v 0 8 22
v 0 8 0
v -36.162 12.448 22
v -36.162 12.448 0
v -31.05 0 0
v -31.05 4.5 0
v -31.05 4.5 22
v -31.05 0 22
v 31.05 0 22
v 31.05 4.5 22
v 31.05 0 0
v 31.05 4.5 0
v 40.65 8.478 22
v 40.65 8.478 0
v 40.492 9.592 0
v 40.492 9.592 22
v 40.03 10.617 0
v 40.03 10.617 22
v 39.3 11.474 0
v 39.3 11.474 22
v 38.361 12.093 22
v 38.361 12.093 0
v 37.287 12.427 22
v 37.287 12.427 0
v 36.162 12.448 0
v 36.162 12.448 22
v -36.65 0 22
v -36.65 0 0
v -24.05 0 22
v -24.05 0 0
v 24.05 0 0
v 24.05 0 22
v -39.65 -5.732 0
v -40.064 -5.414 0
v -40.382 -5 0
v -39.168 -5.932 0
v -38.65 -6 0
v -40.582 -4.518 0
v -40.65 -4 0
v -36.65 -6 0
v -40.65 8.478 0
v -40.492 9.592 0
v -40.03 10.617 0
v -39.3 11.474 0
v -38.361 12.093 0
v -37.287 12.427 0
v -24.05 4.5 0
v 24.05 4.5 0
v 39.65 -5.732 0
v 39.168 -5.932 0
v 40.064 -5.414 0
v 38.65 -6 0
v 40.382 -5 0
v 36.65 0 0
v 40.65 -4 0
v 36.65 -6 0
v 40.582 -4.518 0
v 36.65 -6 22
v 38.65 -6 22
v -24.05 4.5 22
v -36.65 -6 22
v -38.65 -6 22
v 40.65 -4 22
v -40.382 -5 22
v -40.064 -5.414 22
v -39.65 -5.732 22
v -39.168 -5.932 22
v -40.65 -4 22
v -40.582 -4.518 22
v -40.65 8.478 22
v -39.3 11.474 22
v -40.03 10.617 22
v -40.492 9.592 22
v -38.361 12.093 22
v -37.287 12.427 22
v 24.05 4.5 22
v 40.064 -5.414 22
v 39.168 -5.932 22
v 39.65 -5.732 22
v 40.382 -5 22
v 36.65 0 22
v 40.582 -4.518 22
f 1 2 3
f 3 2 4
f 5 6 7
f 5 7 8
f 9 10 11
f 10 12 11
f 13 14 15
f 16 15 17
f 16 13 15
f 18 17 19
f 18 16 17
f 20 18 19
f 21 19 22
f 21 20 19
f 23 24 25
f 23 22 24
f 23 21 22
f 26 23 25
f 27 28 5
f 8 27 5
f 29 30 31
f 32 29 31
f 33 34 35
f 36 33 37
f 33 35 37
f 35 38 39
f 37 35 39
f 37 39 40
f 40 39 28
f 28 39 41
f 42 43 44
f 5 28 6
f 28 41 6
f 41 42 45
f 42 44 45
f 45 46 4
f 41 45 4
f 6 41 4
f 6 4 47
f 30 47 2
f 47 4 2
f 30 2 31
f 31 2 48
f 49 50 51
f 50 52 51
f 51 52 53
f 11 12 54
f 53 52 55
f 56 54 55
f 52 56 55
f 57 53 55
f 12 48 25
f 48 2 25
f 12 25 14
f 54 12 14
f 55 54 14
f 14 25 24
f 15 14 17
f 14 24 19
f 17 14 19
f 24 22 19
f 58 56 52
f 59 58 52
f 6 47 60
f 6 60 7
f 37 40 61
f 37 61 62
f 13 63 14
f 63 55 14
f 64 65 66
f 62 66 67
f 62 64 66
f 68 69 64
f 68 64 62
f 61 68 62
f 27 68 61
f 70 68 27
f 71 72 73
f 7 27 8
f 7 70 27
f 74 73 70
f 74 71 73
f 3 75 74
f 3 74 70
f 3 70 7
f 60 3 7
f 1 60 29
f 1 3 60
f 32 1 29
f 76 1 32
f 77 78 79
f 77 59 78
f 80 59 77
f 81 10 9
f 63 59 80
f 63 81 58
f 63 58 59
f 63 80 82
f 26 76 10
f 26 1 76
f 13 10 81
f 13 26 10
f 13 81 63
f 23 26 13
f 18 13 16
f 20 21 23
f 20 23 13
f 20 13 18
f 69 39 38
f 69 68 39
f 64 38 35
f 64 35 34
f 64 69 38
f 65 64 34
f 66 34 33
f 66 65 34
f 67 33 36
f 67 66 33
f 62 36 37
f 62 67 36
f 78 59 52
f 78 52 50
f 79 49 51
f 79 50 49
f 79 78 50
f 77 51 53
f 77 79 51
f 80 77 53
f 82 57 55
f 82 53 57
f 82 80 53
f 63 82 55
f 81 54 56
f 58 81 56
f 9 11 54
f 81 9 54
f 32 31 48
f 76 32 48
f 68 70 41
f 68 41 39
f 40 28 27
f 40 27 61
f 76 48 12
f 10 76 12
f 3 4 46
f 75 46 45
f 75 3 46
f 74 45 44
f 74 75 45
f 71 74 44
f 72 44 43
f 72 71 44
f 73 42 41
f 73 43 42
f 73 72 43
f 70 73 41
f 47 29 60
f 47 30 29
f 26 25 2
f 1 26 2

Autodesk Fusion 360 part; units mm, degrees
sketch "Sketch1" plane through (0, 0, 0) normal (0, 0, 1) x (1, 0, 0)
  line L0 (-40.65, 0) -> (40.65, 0)
  line L1 (40.65, 0) -> (40.65, 13)
  line L2 (40.65, 13) -> (0, 8)
  line L3 (0, 8) -> (-40.65, 13)
  line L4 (-40.65, 13) -> (-40.65, 0)
  line L5 (0, 8) -> (0, 0) construction
  dimension "d1" = 13
  dimension "d2" = 8
  dimension "d3" = 81.3
extrude "Extrude1" add sketch "Sketch1" along normal blind 22
sketch "Sketch2" plane through (0, 0, 0) normal (0, 0, -1) x (-1, 0, 0)
  line L0 (40.65, 0) -> (40.65, 13)
  line L1 (40.65, 13) -> (0, 8)
  line L2 (0, 8) -> (-40.65, 13)
  line L3 (-40.65, 13) -> (-40.65, 0)
  line L4 (-40.65, 0) -> (40.65, 0)
  line L5 (24.05, 4.5) -> (31.05, 4.5)
  line L6 (31.05, 4.5) -> (31.05, 0)
  line L7 (31.05, 0) -> (24.05, 0)
  line L8 (24.05, 0) -> (24.05, 4.5)
  line L9 (18.6, 10.2878) -> (18.6, 0) construction
  line L10 (36.5, 12.4895) -> (36.5, 0)
  line L11 (0, 8) -> (0, 0) construction
  line L12 (-24.05, 0) -> (-24.05, 4.5)
  line L13 (-24.05, 4.5) -> (-31.05, 4.5)
  line L14 (-31.05, 0) -> (-24.05, 0)
  line L15 (-31.05, 4.5) -> (-31.05, 0)
  point P0 (27.55, 0)
  dimension "d7" = 7
  dimension "d9" = 8.95
  dimension "d10" = 4.5
  dimension "d11" = 4.15
  dimension "d12" = 17.9
extrude "Extrude2" cut sketch "Sketch2" against normal blind 22 contours L4 L5 L6 L7 L8 | L4 L12 L13 L14 L15
sketch "Sketch3" plane through (0, 0, 0) normal (0, 0, -1) x (-1, 0, 0)
  line L0 (31.05, 4.5) -> (31.05, 0)
  line L1 (31.05, 0) -> (40.65, 0)
  line L2 (40.65, 0) -> (40.65, 13)
  line L3 (40.65, 13) -> (0, 8)
  line L4 (0, 8) -> (-40.65, 13)
  line L5 (-40.65, 13) -> (-40.65, 0)
  line L6 (-40.65, 0) -> (-31.05, 0)
  line L7 (-31.05, 0) -> (-31.05, 4.5)
  line L8 (-31.05, 4.5) -> (-24.05, 4.5)
  line L9 (-24.05, 4.5) -> (-24.05, 0)
  line L10 (-24.05, 0) -> (24.05, 0)
  line L11 (24.05, 0) -> (24.05, 4.5)
  line L12 (24.05, 4.5) -> (31.05, 4.5)
  line L13 (0, 8) -> (0, 0) construction
  line L14 (40.65, 0) -> (36.65, 0)
  line L15 (36.65, 0) -> (36.65, -6)
  line L16 (36.65, -6) -> (40.65, -6)
  line L17 (40.65, -6) -> (40.65, 0)
  line L18 (-36.65, 0) -> (-36.65, -6)
  line L19 (-36.65, -6) -> (-40.65, -6)
  line L20 (-40.65, 0) -> (-36.65, 0)
  line L21 (-40.65, -6) -> (-40.65, 0)
  dimension "d15" = 4
  dimension "d16" = 6
extrude "Extrude3" add sketch "Sketch3" against normal blind 22 contours L1 L14 L15 L16 L17 | L6 L18 L19 L20 L21
fillet "Fillet1" radius 4 2 edges at (-40.65, 13, 11) (40.65, 13, 11)
fillet "Fillet2" radius 2 2 edges at (40.65, -6, 11) (-40.65, -6, 11)
equation "d3 = 73 mm + 2 * tolerance + ( 2 * 4 ) * 1 mm"
equation "tolerance = 0.15 mm"
equation "d9 = ( 17.9 / 2 ) * 1 mm"
equation "d11 = 4 mm + tolerance"
